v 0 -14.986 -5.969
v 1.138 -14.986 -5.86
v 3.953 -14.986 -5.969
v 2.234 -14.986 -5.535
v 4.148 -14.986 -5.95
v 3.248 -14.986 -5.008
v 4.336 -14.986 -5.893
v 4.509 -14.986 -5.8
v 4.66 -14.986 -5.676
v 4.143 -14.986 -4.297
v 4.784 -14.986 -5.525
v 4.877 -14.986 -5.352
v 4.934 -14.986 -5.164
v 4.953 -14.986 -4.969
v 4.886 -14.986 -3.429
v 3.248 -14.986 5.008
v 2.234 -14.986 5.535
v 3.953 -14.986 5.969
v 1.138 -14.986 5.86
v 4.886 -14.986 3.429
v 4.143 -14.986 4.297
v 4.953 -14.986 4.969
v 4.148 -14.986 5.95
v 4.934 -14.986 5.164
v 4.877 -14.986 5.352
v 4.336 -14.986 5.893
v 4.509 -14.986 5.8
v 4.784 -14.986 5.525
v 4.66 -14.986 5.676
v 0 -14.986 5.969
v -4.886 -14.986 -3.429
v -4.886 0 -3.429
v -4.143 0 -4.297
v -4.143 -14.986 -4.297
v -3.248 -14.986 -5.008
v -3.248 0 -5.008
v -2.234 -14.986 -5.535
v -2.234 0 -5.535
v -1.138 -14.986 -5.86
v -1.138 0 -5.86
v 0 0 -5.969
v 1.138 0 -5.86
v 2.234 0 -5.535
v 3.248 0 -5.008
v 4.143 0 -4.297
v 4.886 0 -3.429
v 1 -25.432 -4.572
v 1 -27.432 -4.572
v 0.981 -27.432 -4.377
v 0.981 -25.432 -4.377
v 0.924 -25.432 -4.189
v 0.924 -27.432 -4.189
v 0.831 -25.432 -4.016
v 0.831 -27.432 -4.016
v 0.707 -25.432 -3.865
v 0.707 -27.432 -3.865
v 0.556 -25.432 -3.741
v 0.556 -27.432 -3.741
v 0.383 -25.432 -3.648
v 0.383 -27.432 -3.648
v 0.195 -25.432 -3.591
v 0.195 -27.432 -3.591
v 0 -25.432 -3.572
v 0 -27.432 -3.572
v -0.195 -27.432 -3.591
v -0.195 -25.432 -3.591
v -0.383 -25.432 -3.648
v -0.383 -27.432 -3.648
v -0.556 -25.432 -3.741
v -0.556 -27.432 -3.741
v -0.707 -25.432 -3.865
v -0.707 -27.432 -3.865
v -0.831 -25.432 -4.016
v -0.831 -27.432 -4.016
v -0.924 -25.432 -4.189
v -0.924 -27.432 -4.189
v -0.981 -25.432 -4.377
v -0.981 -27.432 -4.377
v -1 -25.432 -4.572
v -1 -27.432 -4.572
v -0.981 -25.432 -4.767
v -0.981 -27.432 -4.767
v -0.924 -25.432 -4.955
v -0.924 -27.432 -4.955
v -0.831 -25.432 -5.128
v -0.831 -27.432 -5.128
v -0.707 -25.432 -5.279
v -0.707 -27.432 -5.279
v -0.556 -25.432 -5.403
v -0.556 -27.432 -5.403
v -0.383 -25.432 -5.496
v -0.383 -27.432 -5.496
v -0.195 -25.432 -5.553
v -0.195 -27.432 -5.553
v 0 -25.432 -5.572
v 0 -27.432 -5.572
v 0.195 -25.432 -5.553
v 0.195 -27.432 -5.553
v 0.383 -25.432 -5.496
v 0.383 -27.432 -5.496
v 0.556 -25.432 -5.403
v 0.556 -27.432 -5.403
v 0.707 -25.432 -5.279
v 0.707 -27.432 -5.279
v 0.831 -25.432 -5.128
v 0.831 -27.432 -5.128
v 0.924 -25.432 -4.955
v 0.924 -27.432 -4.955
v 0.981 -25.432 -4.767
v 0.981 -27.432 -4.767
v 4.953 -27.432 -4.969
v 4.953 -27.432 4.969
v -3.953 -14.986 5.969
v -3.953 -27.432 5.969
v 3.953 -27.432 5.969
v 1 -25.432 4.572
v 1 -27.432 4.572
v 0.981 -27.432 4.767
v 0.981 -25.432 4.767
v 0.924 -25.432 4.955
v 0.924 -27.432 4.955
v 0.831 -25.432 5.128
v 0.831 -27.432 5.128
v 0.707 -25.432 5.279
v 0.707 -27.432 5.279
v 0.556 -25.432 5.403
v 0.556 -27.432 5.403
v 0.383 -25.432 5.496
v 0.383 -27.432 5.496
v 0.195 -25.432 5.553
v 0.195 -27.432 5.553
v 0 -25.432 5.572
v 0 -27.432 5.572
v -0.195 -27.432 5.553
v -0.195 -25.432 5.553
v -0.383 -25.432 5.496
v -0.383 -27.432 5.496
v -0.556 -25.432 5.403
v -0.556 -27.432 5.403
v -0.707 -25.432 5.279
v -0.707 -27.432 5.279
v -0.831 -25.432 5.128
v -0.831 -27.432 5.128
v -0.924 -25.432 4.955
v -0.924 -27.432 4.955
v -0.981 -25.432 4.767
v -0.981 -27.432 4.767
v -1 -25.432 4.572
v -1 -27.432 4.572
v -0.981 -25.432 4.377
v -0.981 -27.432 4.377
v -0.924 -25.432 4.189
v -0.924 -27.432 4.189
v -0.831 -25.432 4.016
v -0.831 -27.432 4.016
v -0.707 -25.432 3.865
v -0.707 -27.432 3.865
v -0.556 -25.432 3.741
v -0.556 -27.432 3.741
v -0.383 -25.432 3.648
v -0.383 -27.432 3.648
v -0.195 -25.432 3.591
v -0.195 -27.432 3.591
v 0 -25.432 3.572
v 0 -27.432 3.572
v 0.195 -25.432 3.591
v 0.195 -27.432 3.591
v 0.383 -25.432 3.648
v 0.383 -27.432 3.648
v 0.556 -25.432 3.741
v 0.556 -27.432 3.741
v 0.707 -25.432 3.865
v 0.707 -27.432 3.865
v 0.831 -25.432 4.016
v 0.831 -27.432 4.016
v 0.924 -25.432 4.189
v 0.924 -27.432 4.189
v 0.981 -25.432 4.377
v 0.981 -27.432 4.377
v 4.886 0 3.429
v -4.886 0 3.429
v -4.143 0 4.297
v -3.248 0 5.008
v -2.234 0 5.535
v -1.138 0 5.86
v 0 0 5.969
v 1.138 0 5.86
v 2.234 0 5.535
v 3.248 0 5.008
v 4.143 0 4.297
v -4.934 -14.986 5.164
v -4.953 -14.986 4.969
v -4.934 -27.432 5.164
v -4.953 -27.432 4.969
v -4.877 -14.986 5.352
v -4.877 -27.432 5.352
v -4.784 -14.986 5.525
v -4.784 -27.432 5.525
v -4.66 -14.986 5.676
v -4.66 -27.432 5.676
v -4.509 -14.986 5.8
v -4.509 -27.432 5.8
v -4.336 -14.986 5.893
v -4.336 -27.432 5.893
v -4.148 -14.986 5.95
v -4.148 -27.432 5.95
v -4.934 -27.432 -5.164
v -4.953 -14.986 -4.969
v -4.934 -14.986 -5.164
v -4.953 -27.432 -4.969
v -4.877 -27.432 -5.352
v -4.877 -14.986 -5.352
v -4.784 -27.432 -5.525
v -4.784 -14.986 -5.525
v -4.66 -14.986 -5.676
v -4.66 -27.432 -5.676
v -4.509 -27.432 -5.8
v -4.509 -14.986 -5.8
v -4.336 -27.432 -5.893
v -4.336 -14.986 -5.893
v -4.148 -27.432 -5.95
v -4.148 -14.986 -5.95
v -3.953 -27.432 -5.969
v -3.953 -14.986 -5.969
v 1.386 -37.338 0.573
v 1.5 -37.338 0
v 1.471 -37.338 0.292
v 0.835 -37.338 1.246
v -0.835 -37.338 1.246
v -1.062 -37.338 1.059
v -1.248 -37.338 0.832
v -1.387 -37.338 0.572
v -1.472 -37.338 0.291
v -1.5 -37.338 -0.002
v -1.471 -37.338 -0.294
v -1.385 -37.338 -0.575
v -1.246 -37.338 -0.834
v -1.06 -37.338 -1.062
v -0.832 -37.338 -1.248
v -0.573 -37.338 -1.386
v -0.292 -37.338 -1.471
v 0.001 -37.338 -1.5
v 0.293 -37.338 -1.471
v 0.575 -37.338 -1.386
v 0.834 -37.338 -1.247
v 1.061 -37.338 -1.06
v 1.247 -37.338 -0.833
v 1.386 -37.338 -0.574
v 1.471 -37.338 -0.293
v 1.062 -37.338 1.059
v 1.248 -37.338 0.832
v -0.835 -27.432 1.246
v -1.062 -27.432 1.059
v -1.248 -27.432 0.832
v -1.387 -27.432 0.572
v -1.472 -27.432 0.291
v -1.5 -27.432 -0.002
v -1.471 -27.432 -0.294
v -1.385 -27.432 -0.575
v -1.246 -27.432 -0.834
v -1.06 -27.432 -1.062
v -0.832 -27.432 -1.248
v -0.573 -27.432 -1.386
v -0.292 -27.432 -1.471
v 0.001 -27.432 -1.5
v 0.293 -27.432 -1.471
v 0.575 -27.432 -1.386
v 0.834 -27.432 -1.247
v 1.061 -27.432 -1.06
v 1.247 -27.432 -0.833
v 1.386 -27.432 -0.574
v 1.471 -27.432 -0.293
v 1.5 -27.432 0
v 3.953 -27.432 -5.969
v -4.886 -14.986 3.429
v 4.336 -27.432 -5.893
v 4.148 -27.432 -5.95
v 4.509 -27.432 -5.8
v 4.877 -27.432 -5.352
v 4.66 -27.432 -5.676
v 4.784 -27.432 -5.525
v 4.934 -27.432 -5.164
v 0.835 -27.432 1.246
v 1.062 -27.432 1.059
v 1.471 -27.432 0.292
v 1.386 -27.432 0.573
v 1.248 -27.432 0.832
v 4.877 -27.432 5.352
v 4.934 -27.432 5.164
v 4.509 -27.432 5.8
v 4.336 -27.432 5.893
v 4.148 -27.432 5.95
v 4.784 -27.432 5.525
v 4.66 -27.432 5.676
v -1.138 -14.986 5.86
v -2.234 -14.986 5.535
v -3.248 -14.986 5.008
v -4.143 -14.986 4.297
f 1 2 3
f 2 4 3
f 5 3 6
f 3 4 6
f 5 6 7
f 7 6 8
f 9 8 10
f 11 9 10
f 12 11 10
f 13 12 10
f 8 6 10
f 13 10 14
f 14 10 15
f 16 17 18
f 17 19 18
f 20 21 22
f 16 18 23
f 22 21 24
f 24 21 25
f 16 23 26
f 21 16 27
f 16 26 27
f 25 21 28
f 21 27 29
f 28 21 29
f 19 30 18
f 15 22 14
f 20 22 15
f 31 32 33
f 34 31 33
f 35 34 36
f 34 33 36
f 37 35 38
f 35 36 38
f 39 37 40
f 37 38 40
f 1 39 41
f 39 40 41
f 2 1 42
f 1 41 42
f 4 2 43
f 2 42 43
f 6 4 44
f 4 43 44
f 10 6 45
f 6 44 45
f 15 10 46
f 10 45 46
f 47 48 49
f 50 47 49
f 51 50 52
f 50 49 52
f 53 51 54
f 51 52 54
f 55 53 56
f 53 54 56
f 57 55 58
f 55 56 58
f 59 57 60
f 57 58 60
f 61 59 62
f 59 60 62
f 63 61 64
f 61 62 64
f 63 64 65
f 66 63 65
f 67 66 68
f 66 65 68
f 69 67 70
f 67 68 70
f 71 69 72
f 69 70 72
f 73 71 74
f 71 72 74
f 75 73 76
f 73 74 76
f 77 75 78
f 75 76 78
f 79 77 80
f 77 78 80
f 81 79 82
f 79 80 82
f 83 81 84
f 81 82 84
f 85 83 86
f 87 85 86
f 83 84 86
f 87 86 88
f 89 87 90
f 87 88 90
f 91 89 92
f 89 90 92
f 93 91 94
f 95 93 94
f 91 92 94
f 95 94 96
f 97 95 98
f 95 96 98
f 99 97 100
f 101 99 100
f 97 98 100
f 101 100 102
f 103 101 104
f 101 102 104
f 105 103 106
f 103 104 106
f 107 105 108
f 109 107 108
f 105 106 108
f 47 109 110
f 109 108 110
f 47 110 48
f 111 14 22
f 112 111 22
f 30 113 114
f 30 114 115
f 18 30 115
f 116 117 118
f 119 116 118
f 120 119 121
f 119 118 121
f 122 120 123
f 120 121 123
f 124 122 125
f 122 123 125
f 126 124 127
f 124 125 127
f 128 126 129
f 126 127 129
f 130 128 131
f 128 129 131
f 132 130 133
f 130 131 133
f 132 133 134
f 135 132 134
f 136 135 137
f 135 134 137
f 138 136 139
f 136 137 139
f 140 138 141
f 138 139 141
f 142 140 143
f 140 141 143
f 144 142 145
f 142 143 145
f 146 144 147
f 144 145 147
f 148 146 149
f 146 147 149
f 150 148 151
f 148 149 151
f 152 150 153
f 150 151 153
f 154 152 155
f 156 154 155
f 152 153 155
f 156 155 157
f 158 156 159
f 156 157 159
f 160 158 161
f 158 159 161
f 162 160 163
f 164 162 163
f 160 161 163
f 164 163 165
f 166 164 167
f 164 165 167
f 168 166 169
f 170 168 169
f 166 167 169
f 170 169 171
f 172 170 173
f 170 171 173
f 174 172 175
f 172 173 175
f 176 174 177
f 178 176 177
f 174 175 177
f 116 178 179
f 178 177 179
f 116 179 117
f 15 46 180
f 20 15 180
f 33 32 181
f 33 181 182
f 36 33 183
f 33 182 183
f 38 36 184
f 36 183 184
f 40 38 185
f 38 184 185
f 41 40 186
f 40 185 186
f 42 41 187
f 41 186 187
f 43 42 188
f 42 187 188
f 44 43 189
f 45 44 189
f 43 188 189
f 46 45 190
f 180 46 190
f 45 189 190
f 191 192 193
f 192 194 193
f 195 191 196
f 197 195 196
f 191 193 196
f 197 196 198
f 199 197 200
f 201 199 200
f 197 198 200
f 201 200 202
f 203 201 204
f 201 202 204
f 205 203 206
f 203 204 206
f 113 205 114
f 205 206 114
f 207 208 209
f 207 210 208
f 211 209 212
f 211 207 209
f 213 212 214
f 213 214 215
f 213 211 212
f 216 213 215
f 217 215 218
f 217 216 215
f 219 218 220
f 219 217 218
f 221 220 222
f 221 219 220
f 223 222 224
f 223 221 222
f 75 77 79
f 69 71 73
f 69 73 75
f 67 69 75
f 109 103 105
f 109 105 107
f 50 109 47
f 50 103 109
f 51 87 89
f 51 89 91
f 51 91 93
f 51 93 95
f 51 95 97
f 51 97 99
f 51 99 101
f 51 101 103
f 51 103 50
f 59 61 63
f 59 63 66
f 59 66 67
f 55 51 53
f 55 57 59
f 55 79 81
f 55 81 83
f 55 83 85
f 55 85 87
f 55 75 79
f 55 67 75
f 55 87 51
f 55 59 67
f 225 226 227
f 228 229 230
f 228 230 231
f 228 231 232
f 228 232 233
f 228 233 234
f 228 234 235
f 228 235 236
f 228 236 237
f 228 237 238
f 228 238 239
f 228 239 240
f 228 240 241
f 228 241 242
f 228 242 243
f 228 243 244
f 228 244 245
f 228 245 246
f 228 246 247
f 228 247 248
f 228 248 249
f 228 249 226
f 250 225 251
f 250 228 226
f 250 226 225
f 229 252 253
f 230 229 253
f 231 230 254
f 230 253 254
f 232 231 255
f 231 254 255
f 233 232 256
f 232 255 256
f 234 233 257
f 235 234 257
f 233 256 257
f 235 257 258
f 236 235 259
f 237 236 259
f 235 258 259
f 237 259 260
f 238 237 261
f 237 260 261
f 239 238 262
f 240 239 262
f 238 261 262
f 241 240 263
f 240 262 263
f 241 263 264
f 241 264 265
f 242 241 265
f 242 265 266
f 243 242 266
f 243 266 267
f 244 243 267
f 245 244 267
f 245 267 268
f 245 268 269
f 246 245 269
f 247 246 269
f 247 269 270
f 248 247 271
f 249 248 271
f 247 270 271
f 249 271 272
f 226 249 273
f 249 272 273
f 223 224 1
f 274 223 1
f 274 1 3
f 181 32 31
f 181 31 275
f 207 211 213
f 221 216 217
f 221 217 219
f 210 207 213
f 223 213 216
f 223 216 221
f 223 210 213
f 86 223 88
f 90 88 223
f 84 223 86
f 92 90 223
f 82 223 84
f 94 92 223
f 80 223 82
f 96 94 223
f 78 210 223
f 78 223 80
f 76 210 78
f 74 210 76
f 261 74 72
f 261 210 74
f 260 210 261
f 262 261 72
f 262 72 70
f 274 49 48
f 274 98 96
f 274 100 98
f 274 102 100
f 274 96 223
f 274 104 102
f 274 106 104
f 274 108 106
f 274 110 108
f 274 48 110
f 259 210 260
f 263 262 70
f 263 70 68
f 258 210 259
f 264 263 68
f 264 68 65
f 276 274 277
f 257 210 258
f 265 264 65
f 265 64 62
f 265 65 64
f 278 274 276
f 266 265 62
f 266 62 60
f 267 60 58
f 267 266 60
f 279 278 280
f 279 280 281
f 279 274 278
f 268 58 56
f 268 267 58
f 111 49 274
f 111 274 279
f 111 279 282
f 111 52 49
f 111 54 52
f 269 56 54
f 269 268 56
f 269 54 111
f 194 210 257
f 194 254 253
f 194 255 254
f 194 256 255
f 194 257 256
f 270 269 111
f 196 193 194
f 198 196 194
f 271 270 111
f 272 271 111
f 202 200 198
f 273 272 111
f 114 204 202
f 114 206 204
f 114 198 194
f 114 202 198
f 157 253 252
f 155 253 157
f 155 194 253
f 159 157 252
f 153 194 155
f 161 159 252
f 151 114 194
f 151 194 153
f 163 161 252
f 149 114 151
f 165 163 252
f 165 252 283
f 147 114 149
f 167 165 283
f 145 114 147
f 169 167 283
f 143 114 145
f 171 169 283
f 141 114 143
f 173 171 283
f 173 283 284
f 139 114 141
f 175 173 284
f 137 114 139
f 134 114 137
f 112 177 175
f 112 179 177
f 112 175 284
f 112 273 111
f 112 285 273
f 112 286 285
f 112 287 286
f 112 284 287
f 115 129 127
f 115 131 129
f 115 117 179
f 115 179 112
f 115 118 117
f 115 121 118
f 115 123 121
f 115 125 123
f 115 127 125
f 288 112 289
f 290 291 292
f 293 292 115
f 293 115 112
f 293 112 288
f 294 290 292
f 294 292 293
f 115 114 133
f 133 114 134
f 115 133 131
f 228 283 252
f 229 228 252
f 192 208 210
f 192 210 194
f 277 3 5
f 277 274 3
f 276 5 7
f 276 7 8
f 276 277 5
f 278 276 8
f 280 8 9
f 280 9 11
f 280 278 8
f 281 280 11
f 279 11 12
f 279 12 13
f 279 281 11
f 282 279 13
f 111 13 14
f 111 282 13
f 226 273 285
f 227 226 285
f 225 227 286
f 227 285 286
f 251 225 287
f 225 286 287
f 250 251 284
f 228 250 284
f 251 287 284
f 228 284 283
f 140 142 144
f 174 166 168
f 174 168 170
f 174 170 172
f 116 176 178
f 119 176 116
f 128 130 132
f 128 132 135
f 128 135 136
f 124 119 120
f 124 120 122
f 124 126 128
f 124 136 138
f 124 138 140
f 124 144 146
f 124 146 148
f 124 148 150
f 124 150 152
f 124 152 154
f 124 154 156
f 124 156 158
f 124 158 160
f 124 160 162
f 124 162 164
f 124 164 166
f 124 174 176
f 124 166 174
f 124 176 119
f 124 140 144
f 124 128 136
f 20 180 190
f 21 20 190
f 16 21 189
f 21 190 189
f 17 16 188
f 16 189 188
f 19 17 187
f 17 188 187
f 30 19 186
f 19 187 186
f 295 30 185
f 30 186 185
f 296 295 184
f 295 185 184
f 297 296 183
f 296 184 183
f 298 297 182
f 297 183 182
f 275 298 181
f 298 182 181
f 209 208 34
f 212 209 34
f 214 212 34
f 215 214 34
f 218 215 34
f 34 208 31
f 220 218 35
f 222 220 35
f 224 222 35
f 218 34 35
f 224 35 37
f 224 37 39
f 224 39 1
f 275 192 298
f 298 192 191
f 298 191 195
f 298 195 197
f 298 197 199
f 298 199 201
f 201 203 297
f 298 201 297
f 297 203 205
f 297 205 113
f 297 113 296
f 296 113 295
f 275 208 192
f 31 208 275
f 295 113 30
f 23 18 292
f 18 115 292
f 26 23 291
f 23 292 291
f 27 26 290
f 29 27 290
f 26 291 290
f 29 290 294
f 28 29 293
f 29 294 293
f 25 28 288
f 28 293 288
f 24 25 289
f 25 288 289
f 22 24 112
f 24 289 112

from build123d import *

# Parameters (mm, degrees)
F0_W     = 9.771576
F0_H     = 6.858
F1_DEPTH = 14.986
F2_W     = 9.906
F2_H     = 11.938
F3_DEPTH = 12.446
F4_R     = 1
F5_DEPTH = 2
F6_R     = 1
F8_DEPTH = 9.906


with BuildPart() as f1:
    # F0 (on Front) → F1 (new body)
    with BuildSketch(Plane.XZ):
        with BuildLine():
            ThreePointArc((4.885788, 3.429), (0, 5.969), (-4.885788, 3.429))
            Line((-4.885788, 3.429), (4.885788, 3.429))
        make_face()
        Rectangle(F0_W, F0_H)
        with BuildLine():
            Line((4.885788, -3.429), (-4.885788, -3.429))
            ThreePointArc((-4.885788, -3.429), (0, -5.969), (4.885788, -3.429))
        make_face()
    extrude(amount=F1_DEPTH)

    # F2 (on face) → F3 (join)
    with BuildSketch(Plane.XZ.offset(14.986)):
        Rectangle(F2_W, F2_H)
    extrude(amount=F3_DEPTH)

    # F4 (on face) → F5 (cut)
    with BuildSketch(Plane.XZ.offset(27.432)):
        with Locations((0, -4.572)):
            Circle(F4_R)
        with Locations((0, 4.572)):
            Circle(F4_R)
    extrude(amount=-F5_DEPTH, mode=Mode.SUBTRACT)

    # F6
    f6_edges = [f1.edges().sort_by_distance(p)[0] for p in [
        (-4.953, -21.209, 5.969),
        (4.953, -21.209, 5.969),
        (4.953, -21.209, -5.969),
        (-4.953, -21.209, -5.969),
    ]]
    fillet(f6_edges, radius=F6_R)

    # F7 (on face) → F8 (join)
    with BuildSketch(Plane.XZ.offset(27.432)):
        with BuildLine():
            ThreePointArc((-0.835155, 1.246), (-0.70614, -1.323392), (1.5, 0))
            ThreePointArc((1.5, 0), (1.323392, 0.70614), (0.835155, 1.246))
            Line((0.835155, 1.246), (-0.835155, 1.246))
        make_face()
    extrude(amount=F8_DEPTH)


solid = f1.part
